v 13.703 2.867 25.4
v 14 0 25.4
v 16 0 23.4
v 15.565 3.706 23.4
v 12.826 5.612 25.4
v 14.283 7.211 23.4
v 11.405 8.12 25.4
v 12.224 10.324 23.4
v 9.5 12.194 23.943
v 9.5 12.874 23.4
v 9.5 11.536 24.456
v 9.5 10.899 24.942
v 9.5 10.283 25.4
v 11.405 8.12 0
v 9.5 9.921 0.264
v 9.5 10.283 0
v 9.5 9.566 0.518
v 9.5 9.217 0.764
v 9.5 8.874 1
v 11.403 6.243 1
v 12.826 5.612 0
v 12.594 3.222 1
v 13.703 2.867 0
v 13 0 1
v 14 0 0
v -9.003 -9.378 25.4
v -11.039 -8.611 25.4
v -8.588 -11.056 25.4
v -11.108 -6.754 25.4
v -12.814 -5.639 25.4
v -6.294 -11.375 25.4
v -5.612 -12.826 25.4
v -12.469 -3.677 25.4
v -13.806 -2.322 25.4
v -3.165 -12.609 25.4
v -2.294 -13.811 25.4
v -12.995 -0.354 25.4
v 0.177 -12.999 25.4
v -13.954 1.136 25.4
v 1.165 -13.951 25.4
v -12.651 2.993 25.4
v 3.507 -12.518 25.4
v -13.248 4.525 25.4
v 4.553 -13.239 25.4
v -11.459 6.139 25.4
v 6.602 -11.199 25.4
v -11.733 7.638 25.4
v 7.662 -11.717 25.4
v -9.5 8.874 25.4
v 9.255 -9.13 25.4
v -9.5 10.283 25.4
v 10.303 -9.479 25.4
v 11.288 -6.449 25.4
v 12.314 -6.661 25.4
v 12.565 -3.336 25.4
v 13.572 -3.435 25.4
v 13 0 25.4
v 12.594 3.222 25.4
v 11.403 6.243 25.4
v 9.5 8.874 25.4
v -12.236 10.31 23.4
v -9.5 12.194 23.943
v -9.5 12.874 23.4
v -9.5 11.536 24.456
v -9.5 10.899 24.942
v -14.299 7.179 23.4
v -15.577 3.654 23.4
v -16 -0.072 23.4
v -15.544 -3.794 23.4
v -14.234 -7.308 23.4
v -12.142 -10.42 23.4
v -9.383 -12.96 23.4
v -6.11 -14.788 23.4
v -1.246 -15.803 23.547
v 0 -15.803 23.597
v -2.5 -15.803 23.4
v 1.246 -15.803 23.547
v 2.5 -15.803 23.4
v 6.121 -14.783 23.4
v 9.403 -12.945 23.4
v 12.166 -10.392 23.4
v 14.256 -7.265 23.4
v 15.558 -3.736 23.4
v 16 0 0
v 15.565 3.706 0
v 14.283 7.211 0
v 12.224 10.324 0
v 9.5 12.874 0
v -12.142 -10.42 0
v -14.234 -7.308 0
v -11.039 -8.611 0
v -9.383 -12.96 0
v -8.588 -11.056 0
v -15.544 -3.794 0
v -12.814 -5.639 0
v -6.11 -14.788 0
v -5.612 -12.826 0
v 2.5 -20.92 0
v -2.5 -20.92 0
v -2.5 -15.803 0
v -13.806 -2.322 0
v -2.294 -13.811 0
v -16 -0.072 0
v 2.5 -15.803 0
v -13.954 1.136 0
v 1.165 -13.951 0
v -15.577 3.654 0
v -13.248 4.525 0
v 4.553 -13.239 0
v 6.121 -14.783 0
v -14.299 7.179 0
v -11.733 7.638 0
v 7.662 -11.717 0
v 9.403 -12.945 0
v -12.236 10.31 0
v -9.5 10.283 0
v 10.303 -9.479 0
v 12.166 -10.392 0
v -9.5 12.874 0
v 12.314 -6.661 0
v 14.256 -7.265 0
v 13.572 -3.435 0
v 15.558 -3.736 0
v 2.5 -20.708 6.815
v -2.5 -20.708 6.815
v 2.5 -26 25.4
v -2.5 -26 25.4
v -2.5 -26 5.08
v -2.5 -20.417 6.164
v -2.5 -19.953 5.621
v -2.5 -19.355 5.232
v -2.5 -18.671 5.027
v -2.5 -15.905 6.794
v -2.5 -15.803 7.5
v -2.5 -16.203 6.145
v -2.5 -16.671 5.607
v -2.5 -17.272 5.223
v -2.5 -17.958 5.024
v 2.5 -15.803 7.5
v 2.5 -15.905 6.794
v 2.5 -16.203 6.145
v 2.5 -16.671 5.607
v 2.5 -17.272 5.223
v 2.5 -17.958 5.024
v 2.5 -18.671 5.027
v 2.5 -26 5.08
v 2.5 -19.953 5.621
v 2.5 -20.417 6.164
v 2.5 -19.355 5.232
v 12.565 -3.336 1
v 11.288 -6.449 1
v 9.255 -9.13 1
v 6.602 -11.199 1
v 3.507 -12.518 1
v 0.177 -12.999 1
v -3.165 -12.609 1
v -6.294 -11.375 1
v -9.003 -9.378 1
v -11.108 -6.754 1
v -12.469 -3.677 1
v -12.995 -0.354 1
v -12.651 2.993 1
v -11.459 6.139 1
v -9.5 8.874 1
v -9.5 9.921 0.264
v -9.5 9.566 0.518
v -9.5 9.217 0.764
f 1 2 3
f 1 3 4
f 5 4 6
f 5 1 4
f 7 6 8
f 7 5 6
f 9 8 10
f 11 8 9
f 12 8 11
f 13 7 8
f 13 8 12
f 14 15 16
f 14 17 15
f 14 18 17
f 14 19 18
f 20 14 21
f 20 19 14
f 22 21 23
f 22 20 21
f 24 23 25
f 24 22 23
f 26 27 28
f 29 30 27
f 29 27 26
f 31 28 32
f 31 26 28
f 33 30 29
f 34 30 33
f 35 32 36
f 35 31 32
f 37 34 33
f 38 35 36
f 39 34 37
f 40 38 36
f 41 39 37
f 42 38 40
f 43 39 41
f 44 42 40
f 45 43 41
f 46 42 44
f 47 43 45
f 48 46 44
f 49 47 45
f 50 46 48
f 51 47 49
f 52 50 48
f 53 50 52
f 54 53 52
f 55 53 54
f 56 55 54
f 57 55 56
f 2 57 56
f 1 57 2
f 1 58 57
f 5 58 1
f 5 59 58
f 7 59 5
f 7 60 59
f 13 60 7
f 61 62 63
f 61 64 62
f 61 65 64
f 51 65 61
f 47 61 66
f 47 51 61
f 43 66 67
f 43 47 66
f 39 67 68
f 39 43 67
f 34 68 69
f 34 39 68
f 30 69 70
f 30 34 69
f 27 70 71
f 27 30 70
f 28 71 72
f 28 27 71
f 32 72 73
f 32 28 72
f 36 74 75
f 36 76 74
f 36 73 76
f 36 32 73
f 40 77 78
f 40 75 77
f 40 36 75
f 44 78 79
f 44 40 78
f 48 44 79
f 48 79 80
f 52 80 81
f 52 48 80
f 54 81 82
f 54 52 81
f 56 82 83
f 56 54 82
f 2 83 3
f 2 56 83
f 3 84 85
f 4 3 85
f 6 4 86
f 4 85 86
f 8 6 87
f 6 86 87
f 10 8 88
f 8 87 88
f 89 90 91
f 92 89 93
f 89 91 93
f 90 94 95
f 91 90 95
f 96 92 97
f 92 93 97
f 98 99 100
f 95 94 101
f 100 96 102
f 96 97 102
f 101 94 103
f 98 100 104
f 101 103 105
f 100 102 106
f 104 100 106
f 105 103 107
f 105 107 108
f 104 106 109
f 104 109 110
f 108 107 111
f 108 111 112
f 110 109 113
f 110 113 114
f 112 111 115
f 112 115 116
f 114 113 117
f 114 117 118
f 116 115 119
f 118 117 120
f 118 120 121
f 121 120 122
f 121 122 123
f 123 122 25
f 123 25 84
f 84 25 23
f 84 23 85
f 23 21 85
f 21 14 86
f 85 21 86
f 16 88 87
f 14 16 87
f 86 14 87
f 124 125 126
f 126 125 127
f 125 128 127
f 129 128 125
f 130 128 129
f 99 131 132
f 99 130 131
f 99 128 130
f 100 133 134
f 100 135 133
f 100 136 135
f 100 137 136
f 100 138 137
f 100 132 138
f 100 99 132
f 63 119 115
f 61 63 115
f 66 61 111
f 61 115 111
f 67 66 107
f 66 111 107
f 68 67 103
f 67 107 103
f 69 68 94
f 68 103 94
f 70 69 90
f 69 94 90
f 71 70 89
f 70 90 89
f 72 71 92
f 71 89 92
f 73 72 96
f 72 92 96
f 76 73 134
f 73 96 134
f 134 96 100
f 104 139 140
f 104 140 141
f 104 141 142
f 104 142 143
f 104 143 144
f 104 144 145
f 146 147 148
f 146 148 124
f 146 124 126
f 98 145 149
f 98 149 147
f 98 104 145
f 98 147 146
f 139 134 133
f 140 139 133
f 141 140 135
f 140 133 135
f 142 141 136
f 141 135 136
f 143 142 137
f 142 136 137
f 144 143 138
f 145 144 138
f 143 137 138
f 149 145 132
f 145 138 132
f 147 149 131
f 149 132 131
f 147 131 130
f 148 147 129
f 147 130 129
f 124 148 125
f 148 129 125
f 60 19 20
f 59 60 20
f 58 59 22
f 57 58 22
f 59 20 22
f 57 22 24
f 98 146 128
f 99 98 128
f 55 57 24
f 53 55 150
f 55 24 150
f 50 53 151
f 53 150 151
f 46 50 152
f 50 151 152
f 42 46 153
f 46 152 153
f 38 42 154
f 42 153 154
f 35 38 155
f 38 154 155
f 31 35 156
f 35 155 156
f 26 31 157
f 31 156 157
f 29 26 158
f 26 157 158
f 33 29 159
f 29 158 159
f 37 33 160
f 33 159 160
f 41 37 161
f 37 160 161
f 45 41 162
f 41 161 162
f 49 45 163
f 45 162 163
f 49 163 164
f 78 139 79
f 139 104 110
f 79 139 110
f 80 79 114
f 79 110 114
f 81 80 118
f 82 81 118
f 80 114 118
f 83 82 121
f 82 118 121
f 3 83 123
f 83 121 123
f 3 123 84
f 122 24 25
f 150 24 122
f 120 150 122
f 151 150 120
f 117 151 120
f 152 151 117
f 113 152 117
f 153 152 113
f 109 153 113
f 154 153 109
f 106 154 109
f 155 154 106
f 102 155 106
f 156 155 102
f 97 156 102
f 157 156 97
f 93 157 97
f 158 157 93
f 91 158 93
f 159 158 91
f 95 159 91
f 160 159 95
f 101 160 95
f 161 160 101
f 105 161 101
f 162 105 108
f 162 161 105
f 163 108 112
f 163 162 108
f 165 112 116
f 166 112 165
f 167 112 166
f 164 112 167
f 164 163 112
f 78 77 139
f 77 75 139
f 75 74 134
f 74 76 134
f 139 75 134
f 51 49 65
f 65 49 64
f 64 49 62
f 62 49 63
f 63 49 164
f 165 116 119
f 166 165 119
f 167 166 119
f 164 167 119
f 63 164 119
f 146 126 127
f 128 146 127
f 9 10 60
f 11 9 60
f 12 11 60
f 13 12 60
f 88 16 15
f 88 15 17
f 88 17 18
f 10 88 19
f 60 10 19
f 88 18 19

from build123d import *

# Parameters (mm, degrees)
F1_DEPTH = 25.4
F3_DEPTH = 25.4
F5_DEPTH = 25.4
F6_SIZE  = 5.08
F7_SIZE  = 1
F8_SIZE  = 2


with BuildPart() as f1:
    # F0 (on Top) → F1 (new body)
    with BuildSketch(Plane.XY):
        with BuildLine():
            Line((9.5, 12.8743931896), (9.5, 8.8741196746))
            ThreePointArc((9.5, 8.8741196746), (12.0933866224, 4.7696960071), (13, 0))
            ThreePointArc((13, 0), (-4.7696960071, -12.0933866224), (-9.5, 8.8741196746))
            Line((-9.5, 8.8741196747), (-9.5, 12.8743931896))
            ThreePointArc((-9.5, 12.8743931896), (-7.2111025509, -14.2828568571), (16, 0))
            ThreePointArc((16, 0), (14.2828568571, 7.2111025509), (9.5, 12.8743931896))
        make_face()
    extrude(amount=F1_DEPTH)

    # F2 (on face) → F3 (join, through all)
    with BuildSketch(Plane(origin=(0, 0, 0), x_dir=(1, 0, 0), z_dir=(0, 0, -1))):
        with BuildLine():
            Line((2.5, 15.8034806293), (2.5, 26))
            Line((2.5, 26), (-2.5, 26))
            Line((-2.5, 26), (-2.5, 15.8034806293))
            ThreePointArc((-2.5, 15.8034806293), (0, 16), (2.5, 15.8034806293))
        make_face()
    extrude(amount=-F3_DEPTH)

    # F4 (on face) → F5 (cut)
    with BuildSketch(Plane(origin=(-2.5, 0, 0), x_dir=(0, -1, 0), z_dir=(-1, 0, 0))):
        with BuildLine():
            ThreePointArc((20.8034806293, 7.5), (20.7794696728, 7.1543437309), (20.7078980242, 6.8153270919))
            Line((20.7078980242, 6.8153270919), (26, 25.4000000001))
            Line((26, 25.4), (15.8034806293, 25.4))
            Line((15.8034806293, 25.4), (15.8034806293, 7.4999999981))
            ThreePointArc((15.8034806293, 7.4999999981), (18.3034806283, 10), (20.8034806293, 7.5))
        make_face()
        with BuildLine():
            ThreePointArc((15.8034806293, 7.4999999981), (17.9578243611, 5.0240109563), (20.7078980242, 6.8153270919))
            ThreePointArc((20.7078980242, 6.8153270919), (20.7794696728, 7.1543437309), (20.8034806293, 7.5))
            ThreePointArc((20.8034806293, 7.5), (18.3034806283, 10), (15.8034806293, 7.4999999981))
        make_face()
    extrude(amount=-F5_DEPTH, mode=Mode.SUBTRACT)

    # F6
    f6_edges = [f1.edges().sort_by_distance(p)[0] for p in [
        (0, -26, 0),
    ]]
    chamfer(f6_edges, length=F6_SIZE)

    # F7
    f7_edges = [f1.edges().sort_by_distance(p)[0] for p in [
        (0, -13, 0),
    ]]
    chamfer(f7_edges, length=F7_SIZE)

    # F8
    f8_edges = [f1.edges().sort_by_distance(p)[0] for p in [
        (14.282857, 7.211103, 25.4),
    ]]
    chamfer(f8_edges, length=F8_SIZE)


solid = f1.part
